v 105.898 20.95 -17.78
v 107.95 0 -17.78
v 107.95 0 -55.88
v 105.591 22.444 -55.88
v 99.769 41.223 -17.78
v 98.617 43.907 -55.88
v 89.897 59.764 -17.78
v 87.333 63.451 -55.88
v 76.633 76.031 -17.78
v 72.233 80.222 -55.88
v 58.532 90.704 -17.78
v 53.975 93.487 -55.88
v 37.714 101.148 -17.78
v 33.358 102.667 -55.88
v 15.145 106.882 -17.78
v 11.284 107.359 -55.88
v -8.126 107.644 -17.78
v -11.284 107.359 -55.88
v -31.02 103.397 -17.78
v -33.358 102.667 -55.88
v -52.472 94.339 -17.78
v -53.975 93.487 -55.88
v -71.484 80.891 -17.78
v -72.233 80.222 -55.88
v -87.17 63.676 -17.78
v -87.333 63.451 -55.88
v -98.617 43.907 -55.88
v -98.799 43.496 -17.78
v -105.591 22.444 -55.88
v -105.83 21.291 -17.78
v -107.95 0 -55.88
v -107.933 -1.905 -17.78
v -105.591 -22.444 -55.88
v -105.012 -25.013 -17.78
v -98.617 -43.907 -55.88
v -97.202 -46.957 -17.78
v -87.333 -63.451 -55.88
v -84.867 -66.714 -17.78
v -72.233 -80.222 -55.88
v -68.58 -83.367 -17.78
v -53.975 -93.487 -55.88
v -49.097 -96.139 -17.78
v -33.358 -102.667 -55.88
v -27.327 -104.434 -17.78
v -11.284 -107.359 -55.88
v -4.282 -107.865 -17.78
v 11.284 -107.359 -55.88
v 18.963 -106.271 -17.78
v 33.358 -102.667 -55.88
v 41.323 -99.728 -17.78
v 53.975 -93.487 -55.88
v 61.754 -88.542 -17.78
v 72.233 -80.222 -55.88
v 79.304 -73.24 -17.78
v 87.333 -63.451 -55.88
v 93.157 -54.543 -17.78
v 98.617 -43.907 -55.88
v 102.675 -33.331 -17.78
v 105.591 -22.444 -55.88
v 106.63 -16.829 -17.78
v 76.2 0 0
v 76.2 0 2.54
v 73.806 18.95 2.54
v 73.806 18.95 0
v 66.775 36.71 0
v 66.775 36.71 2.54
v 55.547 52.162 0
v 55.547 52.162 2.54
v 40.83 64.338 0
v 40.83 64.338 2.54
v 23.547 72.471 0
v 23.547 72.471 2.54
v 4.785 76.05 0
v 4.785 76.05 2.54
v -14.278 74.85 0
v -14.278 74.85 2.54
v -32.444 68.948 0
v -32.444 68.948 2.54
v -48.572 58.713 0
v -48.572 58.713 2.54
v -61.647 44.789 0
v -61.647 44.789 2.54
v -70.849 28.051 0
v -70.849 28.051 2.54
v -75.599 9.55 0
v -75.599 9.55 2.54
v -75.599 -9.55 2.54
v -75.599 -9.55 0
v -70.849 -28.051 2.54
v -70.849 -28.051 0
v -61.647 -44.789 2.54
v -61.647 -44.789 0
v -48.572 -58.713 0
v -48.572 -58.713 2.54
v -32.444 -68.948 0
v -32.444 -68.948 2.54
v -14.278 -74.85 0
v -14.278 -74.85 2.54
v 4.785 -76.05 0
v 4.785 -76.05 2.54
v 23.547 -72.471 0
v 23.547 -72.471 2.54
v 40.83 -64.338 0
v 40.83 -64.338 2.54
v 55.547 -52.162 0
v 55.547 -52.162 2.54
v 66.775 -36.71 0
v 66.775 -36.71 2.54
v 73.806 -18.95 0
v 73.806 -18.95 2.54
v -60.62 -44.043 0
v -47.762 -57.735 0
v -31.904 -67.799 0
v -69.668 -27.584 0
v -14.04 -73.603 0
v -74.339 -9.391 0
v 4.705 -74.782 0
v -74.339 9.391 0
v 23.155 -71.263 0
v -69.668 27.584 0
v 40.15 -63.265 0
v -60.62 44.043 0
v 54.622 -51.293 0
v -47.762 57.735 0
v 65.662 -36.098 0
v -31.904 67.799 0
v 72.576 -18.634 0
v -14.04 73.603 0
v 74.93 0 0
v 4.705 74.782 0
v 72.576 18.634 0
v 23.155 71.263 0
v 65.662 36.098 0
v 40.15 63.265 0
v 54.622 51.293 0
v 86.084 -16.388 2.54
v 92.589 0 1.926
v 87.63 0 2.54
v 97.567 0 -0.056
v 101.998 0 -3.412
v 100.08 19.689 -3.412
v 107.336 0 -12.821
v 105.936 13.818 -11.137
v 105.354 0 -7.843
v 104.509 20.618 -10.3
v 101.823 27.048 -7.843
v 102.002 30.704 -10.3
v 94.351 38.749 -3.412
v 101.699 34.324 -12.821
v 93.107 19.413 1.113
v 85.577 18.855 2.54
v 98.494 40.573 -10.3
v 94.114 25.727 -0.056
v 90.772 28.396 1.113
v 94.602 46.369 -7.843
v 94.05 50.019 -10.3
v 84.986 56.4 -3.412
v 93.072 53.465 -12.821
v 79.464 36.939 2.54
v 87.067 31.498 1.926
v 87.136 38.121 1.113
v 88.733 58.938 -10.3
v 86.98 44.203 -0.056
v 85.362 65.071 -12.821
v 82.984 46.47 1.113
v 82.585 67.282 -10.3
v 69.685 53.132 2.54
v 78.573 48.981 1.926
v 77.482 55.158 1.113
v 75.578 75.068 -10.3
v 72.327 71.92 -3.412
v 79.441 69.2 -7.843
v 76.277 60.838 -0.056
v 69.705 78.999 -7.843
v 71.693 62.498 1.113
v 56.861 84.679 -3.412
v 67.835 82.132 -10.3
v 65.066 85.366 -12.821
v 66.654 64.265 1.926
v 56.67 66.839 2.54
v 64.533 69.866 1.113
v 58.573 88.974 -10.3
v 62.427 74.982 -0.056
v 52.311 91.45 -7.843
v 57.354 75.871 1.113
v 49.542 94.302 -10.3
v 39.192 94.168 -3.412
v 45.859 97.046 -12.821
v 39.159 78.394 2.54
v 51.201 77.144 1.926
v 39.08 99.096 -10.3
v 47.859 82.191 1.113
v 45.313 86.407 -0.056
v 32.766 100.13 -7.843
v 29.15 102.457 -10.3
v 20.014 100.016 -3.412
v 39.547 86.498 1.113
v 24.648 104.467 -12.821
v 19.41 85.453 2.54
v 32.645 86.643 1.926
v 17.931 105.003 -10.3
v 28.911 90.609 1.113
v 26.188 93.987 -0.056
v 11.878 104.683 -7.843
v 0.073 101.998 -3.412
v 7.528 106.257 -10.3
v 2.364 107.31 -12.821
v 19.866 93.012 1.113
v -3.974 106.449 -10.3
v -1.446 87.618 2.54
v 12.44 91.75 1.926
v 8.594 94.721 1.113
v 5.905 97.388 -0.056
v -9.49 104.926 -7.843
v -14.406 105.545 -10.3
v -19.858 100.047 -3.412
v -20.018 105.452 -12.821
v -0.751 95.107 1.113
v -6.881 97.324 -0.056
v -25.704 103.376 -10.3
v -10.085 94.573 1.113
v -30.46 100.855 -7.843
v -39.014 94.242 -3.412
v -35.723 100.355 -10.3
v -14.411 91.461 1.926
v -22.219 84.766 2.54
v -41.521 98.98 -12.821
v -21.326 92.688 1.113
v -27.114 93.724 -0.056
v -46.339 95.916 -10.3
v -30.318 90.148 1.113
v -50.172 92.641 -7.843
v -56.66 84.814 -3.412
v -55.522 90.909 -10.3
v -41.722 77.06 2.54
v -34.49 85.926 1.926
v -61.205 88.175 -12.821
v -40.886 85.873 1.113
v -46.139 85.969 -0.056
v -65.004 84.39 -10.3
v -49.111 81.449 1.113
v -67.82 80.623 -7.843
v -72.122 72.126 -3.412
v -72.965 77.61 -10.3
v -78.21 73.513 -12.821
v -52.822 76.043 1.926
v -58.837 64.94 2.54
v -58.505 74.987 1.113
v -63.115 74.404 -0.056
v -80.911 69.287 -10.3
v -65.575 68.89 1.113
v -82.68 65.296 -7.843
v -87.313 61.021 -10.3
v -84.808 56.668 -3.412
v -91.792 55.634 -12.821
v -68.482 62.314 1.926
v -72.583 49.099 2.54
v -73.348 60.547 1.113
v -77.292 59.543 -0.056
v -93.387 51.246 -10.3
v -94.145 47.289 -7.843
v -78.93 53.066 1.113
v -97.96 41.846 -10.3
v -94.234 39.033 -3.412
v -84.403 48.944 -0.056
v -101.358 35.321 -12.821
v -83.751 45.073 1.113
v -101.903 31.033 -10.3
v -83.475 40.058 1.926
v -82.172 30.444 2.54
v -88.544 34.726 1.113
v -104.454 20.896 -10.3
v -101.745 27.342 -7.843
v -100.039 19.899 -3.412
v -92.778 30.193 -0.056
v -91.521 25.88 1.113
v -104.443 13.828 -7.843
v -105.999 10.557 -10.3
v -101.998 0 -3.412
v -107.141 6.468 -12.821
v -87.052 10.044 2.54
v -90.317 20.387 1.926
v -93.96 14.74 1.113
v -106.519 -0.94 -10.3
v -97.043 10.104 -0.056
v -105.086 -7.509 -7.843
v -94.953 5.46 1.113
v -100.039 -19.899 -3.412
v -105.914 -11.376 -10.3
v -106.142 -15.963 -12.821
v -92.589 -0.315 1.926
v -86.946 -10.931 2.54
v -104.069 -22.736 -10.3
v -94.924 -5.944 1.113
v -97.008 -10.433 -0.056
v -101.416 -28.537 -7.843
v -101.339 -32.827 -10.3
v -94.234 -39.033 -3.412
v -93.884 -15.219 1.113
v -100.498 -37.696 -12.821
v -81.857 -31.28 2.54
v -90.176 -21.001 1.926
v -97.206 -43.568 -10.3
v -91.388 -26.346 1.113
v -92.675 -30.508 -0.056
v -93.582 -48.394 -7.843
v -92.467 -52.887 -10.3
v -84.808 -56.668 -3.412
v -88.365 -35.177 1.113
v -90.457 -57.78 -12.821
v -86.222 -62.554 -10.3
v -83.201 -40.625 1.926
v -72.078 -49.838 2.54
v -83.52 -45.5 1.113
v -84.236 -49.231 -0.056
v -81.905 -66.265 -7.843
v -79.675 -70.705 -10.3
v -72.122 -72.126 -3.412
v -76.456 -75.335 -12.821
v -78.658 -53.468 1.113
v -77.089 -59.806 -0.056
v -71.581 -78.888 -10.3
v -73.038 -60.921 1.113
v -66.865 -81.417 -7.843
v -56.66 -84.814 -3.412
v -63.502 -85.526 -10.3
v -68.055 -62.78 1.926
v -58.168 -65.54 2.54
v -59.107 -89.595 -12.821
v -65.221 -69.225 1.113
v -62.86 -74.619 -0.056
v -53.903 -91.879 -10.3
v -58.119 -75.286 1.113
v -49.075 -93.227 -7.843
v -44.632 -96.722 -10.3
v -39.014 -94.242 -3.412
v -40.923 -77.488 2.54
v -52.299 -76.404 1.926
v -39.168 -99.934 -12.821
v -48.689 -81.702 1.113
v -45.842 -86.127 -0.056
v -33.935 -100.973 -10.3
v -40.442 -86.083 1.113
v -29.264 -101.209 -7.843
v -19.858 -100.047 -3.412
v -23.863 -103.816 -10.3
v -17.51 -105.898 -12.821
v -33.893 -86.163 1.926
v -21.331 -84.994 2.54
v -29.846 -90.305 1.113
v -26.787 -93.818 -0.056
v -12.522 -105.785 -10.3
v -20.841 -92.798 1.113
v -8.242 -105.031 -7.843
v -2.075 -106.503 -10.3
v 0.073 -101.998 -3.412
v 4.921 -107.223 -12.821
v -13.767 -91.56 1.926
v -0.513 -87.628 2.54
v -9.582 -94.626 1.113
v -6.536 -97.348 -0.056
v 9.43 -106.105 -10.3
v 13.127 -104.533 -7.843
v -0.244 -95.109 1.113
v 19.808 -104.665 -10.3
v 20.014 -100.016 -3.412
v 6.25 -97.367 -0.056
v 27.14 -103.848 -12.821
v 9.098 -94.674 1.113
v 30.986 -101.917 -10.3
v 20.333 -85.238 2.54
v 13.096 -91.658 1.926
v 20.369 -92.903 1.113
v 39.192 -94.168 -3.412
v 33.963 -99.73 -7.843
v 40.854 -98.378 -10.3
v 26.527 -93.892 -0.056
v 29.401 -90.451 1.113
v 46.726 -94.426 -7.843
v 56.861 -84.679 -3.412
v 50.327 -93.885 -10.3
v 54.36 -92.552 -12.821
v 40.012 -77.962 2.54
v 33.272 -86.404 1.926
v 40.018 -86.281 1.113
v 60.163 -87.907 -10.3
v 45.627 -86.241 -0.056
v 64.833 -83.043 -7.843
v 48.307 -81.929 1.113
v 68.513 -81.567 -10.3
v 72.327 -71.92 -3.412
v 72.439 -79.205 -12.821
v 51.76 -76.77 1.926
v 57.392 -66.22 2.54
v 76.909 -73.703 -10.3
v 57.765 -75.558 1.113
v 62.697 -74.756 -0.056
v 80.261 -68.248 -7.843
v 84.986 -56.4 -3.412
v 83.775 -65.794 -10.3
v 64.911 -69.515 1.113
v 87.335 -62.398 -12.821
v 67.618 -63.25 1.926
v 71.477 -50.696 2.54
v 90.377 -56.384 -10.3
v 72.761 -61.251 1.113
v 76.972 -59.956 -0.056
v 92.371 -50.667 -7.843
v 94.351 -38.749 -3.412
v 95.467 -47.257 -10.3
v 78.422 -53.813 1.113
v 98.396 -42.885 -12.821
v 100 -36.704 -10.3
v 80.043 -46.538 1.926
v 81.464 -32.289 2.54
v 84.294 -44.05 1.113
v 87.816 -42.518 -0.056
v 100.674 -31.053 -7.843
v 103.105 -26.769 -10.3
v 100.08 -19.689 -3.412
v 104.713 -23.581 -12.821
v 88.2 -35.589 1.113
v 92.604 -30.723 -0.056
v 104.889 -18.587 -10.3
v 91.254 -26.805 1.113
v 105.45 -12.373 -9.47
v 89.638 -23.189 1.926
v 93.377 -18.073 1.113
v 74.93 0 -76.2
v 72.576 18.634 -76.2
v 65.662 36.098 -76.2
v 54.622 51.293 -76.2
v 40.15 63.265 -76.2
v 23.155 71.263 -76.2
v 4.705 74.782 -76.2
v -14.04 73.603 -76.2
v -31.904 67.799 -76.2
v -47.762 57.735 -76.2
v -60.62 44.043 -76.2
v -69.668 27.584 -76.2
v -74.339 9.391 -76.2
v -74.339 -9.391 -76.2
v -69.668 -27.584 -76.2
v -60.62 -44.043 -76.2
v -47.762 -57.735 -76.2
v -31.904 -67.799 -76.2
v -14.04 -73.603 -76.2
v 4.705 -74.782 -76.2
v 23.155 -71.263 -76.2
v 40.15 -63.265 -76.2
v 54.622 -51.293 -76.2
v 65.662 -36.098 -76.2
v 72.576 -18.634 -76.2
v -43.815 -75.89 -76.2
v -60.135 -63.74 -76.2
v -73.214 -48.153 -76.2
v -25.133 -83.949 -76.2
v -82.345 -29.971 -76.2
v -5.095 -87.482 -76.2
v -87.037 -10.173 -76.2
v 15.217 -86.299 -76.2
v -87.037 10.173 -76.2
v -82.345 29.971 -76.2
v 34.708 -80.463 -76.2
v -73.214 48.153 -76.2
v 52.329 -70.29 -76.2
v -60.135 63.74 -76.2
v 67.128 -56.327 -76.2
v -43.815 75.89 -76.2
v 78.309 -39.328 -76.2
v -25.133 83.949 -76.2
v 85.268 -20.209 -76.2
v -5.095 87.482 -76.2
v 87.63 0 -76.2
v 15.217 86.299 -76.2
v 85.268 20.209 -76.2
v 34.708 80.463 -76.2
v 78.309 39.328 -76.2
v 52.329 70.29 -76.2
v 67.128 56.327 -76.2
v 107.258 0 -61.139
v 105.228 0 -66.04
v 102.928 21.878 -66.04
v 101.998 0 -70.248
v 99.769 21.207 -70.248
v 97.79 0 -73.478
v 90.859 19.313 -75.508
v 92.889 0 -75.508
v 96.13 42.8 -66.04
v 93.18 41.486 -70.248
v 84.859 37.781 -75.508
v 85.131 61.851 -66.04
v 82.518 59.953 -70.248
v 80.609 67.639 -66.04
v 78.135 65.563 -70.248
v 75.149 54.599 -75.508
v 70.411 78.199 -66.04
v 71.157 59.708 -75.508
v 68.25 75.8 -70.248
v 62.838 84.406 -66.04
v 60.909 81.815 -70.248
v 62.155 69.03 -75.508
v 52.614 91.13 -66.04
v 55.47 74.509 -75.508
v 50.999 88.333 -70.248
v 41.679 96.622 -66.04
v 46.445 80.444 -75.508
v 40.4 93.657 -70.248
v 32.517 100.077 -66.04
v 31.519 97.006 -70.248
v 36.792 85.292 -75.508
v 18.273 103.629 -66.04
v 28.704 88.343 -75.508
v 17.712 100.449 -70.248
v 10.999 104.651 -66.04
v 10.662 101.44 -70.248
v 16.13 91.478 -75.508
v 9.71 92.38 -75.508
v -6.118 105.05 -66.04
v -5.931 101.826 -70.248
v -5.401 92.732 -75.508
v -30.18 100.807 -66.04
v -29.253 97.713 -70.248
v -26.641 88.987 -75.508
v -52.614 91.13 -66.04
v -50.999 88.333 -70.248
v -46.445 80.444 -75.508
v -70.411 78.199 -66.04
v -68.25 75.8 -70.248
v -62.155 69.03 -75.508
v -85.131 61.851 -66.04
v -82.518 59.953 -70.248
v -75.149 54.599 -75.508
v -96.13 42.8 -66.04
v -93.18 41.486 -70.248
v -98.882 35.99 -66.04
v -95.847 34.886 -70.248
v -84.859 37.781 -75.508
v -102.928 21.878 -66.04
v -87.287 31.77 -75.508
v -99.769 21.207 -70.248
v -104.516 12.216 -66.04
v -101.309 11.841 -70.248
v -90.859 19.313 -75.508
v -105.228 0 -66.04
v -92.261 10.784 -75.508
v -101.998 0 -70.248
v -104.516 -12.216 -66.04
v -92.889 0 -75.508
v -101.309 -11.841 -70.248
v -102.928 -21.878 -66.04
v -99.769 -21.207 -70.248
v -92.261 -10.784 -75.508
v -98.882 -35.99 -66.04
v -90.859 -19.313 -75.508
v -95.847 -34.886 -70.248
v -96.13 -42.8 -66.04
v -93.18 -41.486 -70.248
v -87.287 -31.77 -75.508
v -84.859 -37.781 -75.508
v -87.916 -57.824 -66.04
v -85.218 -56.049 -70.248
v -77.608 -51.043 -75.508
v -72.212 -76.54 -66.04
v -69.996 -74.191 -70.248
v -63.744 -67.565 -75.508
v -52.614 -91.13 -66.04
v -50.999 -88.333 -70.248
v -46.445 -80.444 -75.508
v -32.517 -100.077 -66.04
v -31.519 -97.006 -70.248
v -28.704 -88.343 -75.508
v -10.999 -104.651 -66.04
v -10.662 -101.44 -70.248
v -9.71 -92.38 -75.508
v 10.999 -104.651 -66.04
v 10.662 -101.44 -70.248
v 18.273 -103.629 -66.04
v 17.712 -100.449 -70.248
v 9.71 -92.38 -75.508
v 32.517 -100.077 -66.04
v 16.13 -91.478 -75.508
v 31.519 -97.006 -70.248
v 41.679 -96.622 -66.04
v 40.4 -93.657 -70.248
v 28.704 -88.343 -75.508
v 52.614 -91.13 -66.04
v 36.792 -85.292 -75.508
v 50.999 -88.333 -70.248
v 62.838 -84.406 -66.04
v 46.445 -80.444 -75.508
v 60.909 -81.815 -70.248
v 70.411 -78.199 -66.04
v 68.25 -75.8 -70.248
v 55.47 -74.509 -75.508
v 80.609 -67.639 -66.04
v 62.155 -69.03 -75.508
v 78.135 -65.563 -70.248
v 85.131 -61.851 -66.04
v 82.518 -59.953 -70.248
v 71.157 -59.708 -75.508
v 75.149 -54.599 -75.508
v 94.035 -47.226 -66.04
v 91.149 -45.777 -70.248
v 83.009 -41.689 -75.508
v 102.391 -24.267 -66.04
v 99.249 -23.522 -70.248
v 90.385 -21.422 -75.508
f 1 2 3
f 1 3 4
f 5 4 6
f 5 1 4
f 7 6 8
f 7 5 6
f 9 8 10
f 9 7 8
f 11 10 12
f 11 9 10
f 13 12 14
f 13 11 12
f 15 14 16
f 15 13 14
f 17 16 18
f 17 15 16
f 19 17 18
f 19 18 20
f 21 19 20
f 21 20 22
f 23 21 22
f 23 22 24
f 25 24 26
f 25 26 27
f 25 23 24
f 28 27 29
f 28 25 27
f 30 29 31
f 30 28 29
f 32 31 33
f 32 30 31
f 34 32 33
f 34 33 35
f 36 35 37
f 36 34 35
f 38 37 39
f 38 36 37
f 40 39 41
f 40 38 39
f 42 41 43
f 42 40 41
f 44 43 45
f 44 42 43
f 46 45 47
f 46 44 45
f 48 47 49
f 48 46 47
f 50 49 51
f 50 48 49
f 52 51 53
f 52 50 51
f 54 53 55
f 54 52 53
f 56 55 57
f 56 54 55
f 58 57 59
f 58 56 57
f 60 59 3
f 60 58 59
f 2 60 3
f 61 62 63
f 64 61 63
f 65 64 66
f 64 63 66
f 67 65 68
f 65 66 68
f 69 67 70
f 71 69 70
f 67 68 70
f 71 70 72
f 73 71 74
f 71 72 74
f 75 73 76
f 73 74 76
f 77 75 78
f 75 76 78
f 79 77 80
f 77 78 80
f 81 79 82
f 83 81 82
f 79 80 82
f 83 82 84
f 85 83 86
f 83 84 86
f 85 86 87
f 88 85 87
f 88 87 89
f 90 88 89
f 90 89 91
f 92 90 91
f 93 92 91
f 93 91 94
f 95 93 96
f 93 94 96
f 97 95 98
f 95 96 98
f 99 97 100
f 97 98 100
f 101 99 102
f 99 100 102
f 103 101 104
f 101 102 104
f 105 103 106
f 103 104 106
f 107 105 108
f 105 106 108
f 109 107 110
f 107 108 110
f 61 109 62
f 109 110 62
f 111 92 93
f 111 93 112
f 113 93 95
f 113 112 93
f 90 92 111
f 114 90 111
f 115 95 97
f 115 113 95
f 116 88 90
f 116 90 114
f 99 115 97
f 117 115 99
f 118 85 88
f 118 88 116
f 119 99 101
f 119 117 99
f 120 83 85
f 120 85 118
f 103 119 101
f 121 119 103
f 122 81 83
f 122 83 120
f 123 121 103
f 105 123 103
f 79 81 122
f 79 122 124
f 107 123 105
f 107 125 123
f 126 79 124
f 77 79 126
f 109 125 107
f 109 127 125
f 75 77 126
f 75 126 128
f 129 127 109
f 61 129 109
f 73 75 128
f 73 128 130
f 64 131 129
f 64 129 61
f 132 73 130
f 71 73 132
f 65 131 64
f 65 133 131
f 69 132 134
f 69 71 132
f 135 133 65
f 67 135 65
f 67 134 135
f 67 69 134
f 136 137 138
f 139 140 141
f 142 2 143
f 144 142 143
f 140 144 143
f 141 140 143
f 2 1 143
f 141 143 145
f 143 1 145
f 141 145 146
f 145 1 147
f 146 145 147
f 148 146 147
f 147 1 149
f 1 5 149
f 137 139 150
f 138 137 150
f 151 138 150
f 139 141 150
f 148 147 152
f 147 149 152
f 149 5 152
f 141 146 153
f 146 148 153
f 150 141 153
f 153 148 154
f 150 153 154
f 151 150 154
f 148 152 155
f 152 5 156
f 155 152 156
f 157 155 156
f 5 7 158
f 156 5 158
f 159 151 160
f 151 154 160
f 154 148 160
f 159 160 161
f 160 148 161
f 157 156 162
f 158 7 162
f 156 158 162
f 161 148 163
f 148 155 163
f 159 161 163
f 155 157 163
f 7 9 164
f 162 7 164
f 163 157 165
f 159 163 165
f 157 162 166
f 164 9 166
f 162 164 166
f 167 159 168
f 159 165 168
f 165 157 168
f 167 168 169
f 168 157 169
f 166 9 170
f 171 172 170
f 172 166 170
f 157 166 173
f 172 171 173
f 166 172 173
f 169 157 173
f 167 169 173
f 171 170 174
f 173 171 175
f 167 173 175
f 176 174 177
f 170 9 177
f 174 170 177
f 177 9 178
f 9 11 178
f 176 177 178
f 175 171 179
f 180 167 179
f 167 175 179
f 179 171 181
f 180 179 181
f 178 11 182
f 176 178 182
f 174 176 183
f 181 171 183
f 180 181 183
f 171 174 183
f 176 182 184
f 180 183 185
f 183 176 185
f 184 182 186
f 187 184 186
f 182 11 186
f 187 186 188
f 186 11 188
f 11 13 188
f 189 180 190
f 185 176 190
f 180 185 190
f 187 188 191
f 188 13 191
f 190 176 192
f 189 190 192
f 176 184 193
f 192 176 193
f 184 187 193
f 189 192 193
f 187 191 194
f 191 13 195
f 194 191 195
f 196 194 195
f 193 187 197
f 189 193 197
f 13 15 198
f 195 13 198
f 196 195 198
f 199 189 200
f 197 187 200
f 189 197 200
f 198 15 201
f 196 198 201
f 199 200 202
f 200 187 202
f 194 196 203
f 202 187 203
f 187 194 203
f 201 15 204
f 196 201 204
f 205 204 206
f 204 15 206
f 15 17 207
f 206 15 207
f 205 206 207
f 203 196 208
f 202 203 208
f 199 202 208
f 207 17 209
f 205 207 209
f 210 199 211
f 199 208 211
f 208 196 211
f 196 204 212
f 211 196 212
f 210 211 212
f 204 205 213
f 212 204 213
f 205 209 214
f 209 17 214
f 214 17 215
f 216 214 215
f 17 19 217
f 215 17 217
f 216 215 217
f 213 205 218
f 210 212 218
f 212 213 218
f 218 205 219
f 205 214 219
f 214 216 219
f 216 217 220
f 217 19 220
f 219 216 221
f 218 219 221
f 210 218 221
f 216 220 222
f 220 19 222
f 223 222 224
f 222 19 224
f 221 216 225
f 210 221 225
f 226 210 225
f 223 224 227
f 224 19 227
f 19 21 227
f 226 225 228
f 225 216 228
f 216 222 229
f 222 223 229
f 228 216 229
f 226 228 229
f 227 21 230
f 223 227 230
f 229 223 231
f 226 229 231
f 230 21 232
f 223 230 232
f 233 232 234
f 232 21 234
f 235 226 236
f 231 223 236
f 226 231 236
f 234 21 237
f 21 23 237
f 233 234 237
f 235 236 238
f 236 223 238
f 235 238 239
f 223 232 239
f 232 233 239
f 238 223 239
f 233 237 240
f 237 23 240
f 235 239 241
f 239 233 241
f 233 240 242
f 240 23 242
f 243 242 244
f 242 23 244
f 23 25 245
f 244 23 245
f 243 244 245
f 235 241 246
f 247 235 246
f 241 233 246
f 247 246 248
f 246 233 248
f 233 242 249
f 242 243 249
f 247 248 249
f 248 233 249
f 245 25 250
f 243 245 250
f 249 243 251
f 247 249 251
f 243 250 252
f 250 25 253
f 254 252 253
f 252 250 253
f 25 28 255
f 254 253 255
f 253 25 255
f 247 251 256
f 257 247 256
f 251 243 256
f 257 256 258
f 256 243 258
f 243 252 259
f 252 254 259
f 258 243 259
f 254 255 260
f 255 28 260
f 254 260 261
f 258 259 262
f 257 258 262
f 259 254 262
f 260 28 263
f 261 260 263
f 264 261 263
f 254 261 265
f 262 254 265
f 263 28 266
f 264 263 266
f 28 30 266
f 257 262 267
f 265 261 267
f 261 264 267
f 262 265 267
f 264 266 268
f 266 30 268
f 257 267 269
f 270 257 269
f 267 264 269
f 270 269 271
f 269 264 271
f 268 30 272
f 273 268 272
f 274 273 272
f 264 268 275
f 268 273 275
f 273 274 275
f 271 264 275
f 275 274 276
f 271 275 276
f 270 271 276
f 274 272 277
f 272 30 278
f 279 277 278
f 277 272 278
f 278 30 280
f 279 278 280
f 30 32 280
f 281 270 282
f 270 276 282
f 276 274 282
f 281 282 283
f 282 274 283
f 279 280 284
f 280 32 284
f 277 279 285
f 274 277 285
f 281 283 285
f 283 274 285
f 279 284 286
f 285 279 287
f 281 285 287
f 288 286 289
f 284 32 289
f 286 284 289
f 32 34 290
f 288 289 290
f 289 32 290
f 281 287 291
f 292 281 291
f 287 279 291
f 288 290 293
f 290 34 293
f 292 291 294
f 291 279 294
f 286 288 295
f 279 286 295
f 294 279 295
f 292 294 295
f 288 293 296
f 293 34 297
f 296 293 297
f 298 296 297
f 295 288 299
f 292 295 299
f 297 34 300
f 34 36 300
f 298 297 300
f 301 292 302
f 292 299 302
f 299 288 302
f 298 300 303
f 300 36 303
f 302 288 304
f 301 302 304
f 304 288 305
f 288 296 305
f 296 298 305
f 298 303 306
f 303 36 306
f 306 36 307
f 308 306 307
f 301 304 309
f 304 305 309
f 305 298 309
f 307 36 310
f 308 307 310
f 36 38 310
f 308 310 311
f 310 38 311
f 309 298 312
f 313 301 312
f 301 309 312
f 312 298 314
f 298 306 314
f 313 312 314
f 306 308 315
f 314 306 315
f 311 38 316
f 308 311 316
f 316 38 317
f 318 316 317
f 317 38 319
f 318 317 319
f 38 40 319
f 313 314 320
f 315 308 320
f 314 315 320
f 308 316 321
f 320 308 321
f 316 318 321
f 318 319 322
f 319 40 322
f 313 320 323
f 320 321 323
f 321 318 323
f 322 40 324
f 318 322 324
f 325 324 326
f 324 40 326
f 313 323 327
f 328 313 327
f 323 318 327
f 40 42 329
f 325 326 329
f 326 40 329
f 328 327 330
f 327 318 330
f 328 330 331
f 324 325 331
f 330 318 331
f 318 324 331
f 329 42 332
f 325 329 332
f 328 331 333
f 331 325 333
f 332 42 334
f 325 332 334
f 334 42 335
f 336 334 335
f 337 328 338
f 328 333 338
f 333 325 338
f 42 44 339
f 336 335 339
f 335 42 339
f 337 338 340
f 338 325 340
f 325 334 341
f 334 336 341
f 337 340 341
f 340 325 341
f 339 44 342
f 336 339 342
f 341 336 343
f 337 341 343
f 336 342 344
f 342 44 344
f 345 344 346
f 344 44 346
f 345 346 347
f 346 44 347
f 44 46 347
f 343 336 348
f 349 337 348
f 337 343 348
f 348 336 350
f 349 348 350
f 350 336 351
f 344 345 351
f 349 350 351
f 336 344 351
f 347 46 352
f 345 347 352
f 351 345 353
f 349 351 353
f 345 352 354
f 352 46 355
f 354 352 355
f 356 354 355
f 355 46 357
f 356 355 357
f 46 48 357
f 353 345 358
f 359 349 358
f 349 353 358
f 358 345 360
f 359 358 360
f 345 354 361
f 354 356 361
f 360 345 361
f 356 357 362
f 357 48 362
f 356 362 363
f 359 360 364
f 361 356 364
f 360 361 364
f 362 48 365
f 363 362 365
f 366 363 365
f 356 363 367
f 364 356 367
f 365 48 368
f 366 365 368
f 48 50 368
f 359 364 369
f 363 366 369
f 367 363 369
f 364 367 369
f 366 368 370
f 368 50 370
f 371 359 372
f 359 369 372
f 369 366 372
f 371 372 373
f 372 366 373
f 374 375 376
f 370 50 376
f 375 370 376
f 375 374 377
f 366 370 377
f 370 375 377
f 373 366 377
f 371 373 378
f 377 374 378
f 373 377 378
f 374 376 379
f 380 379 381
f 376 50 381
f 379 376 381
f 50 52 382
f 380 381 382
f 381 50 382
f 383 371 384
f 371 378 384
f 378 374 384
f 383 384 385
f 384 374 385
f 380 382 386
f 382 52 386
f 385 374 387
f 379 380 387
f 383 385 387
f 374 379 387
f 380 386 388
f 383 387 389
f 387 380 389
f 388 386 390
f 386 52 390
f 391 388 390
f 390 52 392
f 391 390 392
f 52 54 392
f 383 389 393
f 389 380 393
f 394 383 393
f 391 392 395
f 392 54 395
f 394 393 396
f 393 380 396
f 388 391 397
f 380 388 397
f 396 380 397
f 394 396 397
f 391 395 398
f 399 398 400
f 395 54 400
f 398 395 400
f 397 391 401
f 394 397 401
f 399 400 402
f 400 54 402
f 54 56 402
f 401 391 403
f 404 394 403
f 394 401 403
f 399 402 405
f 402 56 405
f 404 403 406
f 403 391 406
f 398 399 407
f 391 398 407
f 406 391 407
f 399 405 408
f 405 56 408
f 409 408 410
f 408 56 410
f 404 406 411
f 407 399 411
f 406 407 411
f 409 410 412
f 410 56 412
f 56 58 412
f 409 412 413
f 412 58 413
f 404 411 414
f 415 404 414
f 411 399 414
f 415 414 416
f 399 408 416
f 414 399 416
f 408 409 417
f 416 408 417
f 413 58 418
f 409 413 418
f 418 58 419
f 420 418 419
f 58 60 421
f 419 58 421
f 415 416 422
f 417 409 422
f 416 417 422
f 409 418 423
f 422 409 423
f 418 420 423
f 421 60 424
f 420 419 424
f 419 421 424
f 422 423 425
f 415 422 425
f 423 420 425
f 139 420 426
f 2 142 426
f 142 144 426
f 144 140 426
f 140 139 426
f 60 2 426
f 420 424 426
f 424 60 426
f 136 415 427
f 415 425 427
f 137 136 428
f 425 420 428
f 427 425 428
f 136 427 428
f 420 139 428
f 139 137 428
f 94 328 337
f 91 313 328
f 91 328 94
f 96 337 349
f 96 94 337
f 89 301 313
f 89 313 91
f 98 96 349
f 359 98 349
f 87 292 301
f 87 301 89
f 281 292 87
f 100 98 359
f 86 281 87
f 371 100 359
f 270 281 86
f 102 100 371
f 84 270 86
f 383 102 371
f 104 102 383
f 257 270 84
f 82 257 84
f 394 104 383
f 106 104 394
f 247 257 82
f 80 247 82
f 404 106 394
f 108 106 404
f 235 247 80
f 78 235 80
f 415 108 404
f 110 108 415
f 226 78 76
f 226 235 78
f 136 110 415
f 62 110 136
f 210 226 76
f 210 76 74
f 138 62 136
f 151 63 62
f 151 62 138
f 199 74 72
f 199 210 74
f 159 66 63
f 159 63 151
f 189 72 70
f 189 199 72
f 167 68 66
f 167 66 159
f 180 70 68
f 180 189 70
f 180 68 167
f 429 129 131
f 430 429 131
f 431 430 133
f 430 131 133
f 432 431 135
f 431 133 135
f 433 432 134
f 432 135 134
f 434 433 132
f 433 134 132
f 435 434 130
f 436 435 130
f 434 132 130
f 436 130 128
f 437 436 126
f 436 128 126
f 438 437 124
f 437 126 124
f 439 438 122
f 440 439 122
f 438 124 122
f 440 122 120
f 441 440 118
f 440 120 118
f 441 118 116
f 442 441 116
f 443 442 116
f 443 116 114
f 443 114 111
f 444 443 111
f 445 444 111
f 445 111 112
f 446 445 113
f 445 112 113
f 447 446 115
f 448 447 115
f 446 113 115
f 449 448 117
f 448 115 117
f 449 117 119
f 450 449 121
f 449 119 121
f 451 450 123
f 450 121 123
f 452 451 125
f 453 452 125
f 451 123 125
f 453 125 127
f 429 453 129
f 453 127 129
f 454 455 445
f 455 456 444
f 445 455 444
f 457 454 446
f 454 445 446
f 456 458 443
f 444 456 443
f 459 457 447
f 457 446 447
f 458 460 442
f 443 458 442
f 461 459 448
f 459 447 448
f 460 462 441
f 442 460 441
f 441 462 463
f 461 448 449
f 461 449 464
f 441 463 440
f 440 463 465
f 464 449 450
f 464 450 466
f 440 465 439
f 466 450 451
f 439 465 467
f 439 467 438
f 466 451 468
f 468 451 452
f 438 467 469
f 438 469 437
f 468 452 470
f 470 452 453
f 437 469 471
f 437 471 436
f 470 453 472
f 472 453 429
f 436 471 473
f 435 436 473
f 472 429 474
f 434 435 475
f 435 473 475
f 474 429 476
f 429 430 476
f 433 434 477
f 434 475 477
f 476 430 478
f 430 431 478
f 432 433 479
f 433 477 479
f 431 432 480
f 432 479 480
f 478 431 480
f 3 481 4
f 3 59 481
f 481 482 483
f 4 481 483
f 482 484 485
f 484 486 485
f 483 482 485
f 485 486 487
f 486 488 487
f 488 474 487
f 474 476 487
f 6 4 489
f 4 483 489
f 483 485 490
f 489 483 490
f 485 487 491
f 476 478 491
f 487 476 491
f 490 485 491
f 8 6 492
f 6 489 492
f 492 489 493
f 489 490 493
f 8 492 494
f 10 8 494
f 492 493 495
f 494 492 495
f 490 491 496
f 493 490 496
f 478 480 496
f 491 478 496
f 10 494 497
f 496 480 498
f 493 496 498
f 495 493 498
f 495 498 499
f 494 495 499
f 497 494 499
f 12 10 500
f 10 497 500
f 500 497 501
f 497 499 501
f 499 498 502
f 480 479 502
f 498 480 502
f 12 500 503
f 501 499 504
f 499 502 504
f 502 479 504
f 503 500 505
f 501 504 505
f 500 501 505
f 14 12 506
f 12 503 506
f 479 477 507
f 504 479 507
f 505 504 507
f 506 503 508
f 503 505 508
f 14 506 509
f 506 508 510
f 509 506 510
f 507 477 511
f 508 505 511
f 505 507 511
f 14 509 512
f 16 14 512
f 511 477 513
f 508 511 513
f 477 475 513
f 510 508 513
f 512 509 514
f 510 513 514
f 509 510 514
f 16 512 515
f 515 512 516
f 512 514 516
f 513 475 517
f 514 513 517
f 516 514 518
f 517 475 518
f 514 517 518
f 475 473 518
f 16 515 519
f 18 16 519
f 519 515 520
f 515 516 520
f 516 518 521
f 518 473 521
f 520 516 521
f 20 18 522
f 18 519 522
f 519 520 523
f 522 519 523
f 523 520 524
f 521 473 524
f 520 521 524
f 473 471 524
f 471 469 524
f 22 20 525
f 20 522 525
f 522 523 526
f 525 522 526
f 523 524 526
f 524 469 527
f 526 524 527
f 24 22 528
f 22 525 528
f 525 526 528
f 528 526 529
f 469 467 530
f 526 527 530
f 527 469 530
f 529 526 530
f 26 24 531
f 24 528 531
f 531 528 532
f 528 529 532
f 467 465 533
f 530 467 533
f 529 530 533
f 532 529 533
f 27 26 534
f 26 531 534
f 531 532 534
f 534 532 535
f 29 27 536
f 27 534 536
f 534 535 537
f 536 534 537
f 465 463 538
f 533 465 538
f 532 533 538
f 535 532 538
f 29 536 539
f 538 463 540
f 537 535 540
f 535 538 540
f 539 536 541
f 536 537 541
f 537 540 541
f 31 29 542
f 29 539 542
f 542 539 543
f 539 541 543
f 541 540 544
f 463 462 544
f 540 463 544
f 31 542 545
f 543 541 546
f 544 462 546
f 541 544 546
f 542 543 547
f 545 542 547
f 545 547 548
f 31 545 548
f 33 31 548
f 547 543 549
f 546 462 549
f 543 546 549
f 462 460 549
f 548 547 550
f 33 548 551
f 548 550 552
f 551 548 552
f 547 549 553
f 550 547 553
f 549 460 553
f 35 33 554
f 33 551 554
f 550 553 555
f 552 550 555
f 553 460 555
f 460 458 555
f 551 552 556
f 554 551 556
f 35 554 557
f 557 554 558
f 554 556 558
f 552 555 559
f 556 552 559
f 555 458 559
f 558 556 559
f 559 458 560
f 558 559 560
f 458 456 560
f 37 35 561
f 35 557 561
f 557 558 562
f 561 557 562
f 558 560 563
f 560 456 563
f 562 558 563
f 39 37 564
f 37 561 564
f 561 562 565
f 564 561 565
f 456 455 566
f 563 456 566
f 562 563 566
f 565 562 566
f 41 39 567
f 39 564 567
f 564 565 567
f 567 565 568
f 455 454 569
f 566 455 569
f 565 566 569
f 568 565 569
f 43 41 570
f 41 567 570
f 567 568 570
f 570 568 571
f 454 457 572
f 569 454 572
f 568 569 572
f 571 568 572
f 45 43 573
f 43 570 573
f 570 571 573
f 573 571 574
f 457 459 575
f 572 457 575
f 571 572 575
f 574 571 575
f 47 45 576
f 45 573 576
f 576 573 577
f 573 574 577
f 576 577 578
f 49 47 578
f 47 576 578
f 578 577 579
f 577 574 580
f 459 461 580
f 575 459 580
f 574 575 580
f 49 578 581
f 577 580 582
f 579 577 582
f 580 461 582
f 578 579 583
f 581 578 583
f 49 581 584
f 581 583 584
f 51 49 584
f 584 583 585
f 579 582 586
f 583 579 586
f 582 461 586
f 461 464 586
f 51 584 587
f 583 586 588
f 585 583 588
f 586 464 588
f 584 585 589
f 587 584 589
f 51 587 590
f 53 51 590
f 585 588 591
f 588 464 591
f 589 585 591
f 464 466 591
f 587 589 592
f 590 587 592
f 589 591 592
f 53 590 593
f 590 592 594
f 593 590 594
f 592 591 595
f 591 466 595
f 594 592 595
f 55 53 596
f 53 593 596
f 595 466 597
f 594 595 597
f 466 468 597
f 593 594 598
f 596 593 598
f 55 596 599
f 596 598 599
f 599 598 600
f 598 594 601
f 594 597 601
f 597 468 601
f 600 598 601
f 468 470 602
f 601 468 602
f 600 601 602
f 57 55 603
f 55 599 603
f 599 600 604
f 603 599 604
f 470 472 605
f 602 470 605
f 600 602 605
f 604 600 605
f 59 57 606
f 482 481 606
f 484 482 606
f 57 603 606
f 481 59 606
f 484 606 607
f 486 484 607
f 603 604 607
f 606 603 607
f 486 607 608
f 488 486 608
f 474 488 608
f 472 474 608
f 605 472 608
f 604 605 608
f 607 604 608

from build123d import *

# Parameters (mm, degrees)
F0_R          = 107.95
F0_R_2        = 74.93
F1_DEPTH      = 76.2
F1_DEPTH_BACK = 2.54
F2_R          = 76.2
F2_R_2        = 74.93
F3_DEPTH      = 2.54
F4_R          = 20.32


with BuildPart() as f1:
    # F0 (on Top) → F1 (new body, two sides)
    with BuildSketch(Plane.XY) as f1_sk:
        Circle(F0_R)
        Circle(F0_R_2, mode=Mode.SUBTRACT)
    extrude(amount=-F1_DEPTH)
    extrude(f1_sk.sketch, amount=F1_DEPTH_BACK)

    # F2 (on face) → F3 (cut)
    with BuildSketch(Plane.XY.offset(2.54)):
        Circle(F2_R)
        Circle(F2_R_2, mode=Mode.SUBTRACT)
    extrude(amount=-F3_DEPTH, mode=Mode.SUBTRACT)

    # F4
    f4_edges = [f1.edges().sort_by_distance(p)[0] for p in [
        (-107.95, 0, 2.54),
        (-107.95, 0, -76.2),
    ]]
    fillet(f4_edges, radius=F4_R)


solid = f1.part
